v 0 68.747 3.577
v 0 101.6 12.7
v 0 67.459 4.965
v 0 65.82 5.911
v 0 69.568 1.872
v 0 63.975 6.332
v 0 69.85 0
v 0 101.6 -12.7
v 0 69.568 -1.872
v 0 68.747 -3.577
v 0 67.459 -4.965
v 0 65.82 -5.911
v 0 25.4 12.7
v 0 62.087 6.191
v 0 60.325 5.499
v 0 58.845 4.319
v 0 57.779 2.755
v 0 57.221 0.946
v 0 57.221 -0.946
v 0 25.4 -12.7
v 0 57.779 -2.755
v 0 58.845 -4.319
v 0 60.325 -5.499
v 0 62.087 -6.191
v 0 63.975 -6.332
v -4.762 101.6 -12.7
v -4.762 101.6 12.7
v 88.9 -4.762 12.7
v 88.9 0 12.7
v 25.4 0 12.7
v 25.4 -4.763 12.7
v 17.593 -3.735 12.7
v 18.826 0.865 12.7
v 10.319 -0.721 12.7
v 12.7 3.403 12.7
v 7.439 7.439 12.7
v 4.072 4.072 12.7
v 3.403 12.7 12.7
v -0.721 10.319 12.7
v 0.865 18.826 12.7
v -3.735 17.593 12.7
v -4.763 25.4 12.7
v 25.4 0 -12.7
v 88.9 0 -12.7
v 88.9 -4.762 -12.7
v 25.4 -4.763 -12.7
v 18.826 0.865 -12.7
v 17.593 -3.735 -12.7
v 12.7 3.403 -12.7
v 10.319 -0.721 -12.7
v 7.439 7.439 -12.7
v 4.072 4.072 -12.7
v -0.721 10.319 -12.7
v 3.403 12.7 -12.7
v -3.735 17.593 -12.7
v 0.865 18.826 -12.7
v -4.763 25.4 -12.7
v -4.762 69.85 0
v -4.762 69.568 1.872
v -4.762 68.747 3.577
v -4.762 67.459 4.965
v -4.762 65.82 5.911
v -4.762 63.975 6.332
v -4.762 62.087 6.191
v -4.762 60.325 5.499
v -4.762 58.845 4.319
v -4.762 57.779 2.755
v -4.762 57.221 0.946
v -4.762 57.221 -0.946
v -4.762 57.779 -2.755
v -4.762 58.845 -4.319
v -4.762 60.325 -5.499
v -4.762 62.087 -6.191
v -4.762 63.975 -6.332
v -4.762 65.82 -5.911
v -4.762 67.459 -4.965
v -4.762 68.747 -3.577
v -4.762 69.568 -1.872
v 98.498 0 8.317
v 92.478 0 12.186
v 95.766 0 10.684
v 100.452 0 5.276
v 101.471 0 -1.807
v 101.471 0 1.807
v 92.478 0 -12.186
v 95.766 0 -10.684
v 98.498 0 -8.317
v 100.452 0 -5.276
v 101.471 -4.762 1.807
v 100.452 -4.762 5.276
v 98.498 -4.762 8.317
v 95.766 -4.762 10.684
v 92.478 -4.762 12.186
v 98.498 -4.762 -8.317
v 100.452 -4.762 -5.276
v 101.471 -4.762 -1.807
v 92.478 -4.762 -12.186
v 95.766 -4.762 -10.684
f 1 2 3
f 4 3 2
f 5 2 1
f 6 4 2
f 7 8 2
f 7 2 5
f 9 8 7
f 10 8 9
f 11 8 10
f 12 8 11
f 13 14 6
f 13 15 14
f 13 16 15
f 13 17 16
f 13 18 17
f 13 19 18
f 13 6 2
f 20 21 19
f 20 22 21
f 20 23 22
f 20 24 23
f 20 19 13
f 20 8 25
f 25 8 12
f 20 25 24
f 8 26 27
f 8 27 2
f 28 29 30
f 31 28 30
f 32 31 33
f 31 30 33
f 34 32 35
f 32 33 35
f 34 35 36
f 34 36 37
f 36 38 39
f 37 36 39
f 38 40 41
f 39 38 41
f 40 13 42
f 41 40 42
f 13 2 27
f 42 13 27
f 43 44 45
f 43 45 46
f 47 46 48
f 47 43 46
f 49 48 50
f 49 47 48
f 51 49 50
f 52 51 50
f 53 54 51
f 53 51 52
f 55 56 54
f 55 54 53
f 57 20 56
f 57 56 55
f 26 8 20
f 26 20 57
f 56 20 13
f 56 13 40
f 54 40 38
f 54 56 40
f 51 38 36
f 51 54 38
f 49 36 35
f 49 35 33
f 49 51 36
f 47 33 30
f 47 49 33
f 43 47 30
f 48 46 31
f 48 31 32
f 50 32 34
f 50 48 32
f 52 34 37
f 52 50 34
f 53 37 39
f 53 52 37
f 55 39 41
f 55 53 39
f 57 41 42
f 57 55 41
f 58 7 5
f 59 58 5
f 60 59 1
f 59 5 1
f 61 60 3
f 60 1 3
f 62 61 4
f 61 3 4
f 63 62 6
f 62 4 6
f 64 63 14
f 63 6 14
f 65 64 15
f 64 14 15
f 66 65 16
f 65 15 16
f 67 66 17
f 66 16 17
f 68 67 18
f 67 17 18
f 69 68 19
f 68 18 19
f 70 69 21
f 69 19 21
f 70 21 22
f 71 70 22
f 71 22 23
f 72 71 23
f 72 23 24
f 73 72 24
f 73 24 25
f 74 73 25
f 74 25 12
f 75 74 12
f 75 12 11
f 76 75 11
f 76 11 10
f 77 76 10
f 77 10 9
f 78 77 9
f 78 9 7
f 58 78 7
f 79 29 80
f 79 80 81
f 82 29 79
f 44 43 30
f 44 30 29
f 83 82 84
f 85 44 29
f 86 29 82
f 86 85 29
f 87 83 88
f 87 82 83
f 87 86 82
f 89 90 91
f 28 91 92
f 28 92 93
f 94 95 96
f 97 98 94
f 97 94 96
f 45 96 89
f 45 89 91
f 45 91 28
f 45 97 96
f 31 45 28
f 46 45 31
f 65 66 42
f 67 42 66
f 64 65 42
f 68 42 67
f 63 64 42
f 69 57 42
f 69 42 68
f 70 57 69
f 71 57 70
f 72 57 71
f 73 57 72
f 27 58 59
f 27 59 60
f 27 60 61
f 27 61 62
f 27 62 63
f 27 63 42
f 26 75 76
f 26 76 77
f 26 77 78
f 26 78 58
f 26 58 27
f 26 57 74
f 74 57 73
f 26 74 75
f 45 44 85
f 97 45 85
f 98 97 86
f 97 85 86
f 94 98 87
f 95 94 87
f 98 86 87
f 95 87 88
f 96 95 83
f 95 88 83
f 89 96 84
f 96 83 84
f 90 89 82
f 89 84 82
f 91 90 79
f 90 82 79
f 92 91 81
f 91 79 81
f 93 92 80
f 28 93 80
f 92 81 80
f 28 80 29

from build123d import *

# Parameters (mm, degrees)
EXTRUDE_THIN1_DEPTH      = 12.7
EXTRUDE_THIN1_DEPTH_BACK = 12.7
CUT_EXTRUDE1_DEPTH       = 4.7625
CUT_EXTRUDE2_REACH       = 146.244
SKETCH3_R                = 6.35


with BuildPart() as part:
    # Sketch1 → Extrude-Thin1 (new, two sides: drawn at the far end of the back side and taken through both)
    with BuildSketch(Plane.XY.offset(-EXTRUDE_THIN1_DEPTH_BACK)):
        with BuildLine():
            Line((0, 101.6), (0, 25.4))
            ThreePointArc((0, 25.4), (7.439487758, 7.439487758), (25.4, 0))
            Line((25.4, 0), (101.6, 0))
            Line((101.6, 0), (101.6, -4.7625))
            Line((101.6, -4.7625), (25.4, -4.7625))
            ThreePointArc((25.4, -4.7625), (4.071891712, 4.071891712), (-4.7625, 25.4))
            Line((-4.7625, 25.4), (-4.7625, 101.6))
            Line((-4.7625, 101.6), (0, 101.6))
        make_face()
    extrude(amount=EXTRUDE_THIN1_DEPTH + EXTRUDE_THIN1_DEPTH_BACK)

    # Sketch2 → Cut-Extrude1 (cut)
    with BuildSketch(Plane(origin=(0, 0, 0), x_dir=(-1, 0, 0), z_dir=(0, 1, 0))):
        with BuildLine():
            Line((-88.9, 12.7), (-88.9, 23.152683053))
            Line((-88.9, 23.152683053), (-107.491491885, 23.152683053))
            Line((-107.491491885, 23.152683053), (-107.491491885, -20.225178662))
            Line((-107.491491885, -20.225178662), (-88.9, -20.225178662))
            Line((-88.9, -20.225178662), (-88.9, -12.7))
            ThreePointArc((-88.9, -12.7), (-101.6, 0), (-88.9, 12.7))
        make_face()
    extrude(amount=-CUT_EXTRUDE1_DEPTH, mode=Mode.SUBTRACT)

    # Sketch3 → Cut-Extrude2 (cut, up to next)
    with BuildSketch(Plane(origin=(0, 0, 0), x_dir=(0, 0, -1), z_dir=(1, 0, 0)), mode=Mode.PRIVATE) as cut_extrude2_sk1:
        with Locations(Location((0, 63.5, 0), (0, 0, 90))):
            Circle(SKETCH3_R)
    cut_extrude2_tool1 = extrude(cut_extrude2_sk1.sketch, amount=-CUT_EXTRUDE2_REACH, mode=Mode.PRIVATE) & part.part
    add(cut_extrude2_tool1.solids().sort_by_distance((0, 63.5, 0))[0], mode=Mode.SUBTRACT)


solid = part.part
